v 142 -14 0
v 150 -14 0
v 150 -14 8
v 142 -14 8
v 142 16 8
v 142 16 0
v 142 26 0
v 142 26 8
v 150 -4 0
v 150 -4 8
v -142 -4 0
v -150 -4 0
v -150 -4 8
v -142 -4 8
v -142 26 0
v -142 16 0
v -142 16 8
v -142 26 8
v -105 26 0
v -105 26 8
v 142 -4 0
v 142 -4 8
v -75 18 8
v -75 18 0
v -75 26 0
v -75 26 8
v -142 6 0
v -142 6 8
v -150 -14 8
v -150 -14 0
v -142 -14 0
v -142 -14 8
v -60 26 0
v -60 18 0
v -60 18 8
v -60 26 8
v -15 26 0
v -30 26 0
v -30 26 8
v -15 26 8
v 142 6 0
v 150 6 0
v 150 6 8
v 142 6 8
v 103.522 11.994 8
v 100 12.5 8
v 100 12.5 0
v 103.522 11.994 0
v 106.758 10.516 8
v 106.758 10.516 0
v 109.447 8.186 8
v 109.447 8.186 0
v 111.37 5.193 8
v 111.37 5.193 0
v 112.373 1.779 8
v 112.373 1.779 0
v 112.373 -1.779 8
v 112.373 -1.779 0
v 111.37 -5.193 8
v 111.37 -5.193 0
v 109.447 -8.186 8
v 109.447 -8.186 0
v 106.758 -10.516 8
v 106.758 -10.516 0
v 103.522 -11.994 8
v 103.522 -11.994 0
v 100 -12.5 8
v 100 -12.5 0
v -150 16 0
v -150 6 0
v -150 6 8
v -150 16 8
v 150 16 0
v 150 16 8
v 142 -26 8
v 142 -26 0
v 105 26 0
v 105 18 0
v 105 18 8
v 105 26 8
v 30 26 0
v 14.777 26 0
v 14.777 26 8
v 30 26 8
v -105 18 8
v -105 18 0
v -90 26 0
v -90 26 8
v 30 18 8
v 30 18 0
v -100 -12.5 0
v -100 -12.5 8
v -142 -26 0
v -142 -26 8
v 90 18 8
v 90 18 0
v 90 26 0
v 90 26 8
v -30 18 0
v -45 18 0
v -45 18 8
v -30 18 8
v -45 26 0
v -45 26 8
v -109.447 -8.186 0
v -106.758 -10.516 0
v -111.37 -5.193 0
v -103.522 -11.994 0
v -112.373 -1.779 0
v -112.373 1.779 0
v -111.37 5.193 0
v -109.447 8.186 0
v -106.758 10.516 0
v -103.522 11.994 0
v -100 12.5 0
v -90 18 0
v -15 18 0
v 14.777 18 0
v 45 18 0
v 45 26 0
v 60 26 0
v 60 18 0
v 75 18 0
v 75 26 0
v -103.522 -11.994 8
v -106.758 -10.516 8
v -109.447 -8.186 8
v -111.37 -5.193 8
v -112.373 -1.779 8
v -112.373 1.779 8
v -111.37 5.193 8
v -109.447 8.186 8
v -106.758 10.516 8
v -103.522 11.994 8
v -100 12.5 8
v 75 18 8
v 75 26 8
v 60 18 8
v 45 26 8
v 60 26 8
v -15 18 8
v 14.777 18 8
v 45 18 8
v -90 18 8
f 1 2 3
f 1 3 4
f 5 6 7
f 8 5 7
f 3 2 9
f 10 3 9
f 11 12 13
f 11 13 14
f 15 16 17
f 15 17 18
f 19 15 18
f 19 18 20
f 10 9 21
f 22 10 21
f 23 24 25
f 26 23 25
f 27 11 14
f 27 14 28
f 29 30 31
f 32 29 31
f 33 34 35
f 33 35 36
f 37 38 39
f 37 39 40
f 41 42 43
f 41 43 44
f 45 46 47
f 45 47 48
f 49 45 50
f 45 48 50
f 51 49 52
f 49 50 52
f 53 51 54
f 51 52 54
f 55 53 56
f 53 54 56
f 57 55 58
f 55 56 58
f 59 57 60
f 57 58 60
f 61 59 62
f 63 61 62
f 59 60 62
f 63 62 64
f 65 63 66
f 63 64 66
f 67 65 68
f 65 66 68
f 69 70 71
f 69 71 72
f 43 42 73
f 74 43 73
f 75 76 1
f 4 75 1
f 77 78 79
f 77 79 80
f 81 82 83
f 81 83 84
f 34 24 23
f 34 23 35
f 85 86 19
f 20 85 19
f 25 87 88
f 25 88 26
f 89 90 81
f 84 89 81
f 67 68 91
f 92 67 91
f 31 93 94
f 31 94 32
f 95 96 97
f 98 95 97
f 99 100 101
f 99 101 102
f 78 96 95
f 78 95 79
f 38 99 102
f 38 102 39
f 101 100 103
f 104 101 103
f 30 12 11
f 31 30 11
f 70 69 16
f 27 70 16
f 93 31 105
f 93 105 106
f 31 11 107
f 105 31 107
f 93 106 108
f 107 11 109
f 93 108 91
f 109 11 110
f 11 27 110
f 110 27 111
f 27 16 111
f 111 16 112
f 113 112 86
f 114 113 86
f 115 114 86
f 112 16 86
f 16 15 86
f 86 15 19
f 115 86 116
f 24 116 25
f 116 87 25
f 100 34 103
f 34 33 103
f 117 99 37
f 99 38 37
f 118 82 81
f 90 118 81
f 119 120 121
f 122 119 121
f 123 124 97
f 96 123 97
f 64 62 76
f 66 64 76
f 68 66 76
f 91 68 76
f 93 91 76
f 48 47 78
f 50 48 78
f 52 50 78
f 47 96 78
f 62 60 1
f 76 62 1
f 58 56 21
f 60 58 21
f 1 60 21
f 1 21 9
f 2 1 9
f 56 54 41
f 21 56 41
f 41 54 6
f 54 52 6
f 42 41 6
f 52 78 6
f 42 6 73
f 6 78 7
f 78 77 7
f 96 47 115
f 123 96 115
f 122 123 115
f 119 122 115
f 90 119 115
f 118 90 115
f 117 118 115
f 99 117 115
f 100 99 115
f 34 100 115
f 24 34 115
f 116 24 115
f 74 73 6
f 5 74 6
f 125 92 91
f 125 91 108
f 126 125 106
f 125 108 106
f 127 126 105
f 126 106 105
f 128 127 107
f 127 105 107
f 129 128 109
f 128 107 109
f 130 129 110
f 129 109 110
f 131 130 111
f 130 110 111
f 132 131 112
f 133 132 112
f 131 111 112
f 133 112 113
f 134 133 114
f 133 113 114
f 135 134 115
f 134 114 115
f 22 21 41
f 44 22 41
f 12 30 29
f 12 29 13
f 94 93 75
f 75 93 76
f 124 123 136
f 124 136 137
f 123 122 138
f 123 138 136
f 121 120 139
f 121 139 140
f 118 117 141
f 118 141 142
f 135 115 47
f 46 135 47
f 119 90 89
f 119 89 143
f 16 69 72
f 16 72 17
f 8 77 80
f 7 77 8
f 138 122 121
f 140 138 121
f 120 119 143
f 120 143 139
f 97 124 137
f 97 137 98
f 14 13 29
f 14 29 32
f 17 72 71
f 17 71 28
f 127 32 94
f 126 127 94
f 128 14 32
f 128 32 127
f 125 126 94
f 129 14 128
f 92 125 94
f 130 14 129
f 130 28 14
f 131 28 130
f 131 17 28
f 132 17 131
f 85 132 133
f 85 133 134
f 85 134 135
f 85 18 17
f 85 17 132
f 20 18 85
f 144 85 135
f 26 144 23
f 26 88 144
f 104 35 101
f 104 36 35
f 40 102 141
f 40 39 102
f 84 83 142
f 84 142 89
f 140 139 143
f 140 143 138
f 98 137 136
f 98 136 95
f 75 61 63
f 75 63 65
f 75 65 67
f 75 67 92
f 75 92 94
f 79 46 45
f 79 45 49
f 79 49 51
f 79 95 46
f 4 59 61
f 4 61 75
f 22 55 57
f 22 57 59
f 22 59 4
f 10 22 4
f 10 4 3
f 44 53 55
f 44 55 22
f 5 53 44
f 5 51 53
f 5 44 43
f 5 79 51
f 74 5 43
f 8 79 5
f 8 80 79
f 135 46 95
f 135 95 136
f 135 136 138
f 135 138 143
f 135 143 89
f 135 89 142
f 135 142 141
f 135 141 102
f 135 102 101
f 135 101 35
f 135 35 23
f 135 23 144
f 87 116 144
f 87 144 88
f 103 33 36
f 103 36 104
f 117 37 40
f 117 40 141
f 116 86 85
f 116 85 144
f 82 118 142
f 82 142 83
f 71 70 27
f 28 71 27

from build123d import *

# Parameters (mm, degrees)
ESQUISSE1_W             = 300
ESQUISSE1_H             = 52
BOSS_EXTRU_1_DEPTH      = 8
ESQUISSE2_W             = 8
ESQUISSE2_H             = 10
ENL_V_MAT_EXTRU_1_DEPTH = 153.446712001
ESQUISSE3_W             = 8
ESQUISSE3_H             = 2
ENL_V_MAT_EXTRU_2_DEPTH = 153.446712001
ENL_V_MAT_EXTRU_3_DEPTH = 153.446712001
ESQUISSE5_W             = 15
ESQUISSE5_H             = 8
ENL_V_MAT_EXTRU_4_DEPTH = 10


with BuildPart() as part:
    # Esquisse1 → Boss.-Extru.1 (new body)
    with BuildSketch(Plane.XY):
        Rectangle(ESQUISSE1_W, ESQUISSE1_H)
    extrude(amount=BOSS_EXTRU_1_DEPTH)

    # Esquisse2 → Enlèv. mat.-Extru.1 (cut, through all)
    with BuildSketch(Plane.XY):
        with Locations((-146, 1)):
            Rectangle(ESQUISSE2_W, ESQUISSE2_H)
        with Locations((-146, 21)):
            Rectangle(ESQUISSE2_W, ESQUISSE2_H)
        with Locations((-146, -19)):
            Rectangle(ESQUISSE2_W, ESQUISSE2_H)
    enl_v_mat_extru_1 = extrude(amount=ENL_V_MAT_EXTRU_1_DEPTH, mode=Mode.SUBTRACT)

    # Esquisse3 → Enlèv. mat.-Extru.2 (cut, through all)
    with BuildSketch(Plane.XY):
        with Locations((-146, -25)):
            Rectangle(ESQUISSE3_W, ESQUISSE3_H)
    enl_v_mat_extru_2 = extrude(amount=ENL_V_MAT_EXTRU_2_DEPTH, mode=Mode.SUBTRACT)

    # Symétrie1: Enlèv. mat.-Extru.1, Enlèv. mat.-Extru.2 across plane
    add(enl_v_mat_extru_1.mirror(Plane(origin=(0, 0, 0), x_dir=(0, 0, 1), z_dir=(1, 0, 0))), mode=Mode.SUBTRACT)
    add(enl_v_mat_extru_2.mirror(Plane(origin=(0, 0, 0), x_dir=(0, 0, 1), z_dir=(1, 0, 0))), mode=Mode.SUBTRACT)

    # Esquisse4 → Enlèv. mat.-Extru.3 (cut, through all)
    with BuildSketch(Plane.XY):
        with BuildLine():
            Line((-100, 12.5), (100, 12.5))
            ThreePointArc((100, 12.5), (112.5, 0), (100, -12.5))
            Line((100, -12.5), (-100, -12.5))
            ThreePointArc((-100, -12.5), (-112.5, 0), (-100, 12.5))
        make_face()
    extrude(amount=ENL_V_MAT_EXTRU_3_DEPTH, mode=Mode.SUBTRACT)

    # Esquisse5 → Enlèv. mat.-Extru.4 (cut)
    with BuildSketch(Plane.XY):
        Polygon((0, 26), (-15, 26), (-15, 18), (0, 18), (14.777360912, 18), (14.777360912, 26), align=None)
        with Locations((-37.5, 22)):
            Rectangle(ESQUISSE5_W, ESQUISSE5_H)
        with Locations((-67.5, 22)):
            Rectangle(ESQUISSE5_W, ESQUISSE5_H)
        with Locations((-97.5, 22)):
            Rectangle(ESQUISSE5_W, ESQUISSE5_H)
        with Locations((37.5, 22)):
            Rectangle(ESQUISSE5_W, ESQUISSE5_H)
        with Locations((67.5, 22)):
            Rectangle(ESQUISSE5_W, ESQUISSE5_H)
        with Locations((97.5, 22)):
            Rectangle(ESQUISSE5_W, ESQUISSE5_H)
    extrude(amount=ENL_V_MAT_EXTRU_4_DEPTH, mode=Mode.SUBTRACT)


solid = part.part
